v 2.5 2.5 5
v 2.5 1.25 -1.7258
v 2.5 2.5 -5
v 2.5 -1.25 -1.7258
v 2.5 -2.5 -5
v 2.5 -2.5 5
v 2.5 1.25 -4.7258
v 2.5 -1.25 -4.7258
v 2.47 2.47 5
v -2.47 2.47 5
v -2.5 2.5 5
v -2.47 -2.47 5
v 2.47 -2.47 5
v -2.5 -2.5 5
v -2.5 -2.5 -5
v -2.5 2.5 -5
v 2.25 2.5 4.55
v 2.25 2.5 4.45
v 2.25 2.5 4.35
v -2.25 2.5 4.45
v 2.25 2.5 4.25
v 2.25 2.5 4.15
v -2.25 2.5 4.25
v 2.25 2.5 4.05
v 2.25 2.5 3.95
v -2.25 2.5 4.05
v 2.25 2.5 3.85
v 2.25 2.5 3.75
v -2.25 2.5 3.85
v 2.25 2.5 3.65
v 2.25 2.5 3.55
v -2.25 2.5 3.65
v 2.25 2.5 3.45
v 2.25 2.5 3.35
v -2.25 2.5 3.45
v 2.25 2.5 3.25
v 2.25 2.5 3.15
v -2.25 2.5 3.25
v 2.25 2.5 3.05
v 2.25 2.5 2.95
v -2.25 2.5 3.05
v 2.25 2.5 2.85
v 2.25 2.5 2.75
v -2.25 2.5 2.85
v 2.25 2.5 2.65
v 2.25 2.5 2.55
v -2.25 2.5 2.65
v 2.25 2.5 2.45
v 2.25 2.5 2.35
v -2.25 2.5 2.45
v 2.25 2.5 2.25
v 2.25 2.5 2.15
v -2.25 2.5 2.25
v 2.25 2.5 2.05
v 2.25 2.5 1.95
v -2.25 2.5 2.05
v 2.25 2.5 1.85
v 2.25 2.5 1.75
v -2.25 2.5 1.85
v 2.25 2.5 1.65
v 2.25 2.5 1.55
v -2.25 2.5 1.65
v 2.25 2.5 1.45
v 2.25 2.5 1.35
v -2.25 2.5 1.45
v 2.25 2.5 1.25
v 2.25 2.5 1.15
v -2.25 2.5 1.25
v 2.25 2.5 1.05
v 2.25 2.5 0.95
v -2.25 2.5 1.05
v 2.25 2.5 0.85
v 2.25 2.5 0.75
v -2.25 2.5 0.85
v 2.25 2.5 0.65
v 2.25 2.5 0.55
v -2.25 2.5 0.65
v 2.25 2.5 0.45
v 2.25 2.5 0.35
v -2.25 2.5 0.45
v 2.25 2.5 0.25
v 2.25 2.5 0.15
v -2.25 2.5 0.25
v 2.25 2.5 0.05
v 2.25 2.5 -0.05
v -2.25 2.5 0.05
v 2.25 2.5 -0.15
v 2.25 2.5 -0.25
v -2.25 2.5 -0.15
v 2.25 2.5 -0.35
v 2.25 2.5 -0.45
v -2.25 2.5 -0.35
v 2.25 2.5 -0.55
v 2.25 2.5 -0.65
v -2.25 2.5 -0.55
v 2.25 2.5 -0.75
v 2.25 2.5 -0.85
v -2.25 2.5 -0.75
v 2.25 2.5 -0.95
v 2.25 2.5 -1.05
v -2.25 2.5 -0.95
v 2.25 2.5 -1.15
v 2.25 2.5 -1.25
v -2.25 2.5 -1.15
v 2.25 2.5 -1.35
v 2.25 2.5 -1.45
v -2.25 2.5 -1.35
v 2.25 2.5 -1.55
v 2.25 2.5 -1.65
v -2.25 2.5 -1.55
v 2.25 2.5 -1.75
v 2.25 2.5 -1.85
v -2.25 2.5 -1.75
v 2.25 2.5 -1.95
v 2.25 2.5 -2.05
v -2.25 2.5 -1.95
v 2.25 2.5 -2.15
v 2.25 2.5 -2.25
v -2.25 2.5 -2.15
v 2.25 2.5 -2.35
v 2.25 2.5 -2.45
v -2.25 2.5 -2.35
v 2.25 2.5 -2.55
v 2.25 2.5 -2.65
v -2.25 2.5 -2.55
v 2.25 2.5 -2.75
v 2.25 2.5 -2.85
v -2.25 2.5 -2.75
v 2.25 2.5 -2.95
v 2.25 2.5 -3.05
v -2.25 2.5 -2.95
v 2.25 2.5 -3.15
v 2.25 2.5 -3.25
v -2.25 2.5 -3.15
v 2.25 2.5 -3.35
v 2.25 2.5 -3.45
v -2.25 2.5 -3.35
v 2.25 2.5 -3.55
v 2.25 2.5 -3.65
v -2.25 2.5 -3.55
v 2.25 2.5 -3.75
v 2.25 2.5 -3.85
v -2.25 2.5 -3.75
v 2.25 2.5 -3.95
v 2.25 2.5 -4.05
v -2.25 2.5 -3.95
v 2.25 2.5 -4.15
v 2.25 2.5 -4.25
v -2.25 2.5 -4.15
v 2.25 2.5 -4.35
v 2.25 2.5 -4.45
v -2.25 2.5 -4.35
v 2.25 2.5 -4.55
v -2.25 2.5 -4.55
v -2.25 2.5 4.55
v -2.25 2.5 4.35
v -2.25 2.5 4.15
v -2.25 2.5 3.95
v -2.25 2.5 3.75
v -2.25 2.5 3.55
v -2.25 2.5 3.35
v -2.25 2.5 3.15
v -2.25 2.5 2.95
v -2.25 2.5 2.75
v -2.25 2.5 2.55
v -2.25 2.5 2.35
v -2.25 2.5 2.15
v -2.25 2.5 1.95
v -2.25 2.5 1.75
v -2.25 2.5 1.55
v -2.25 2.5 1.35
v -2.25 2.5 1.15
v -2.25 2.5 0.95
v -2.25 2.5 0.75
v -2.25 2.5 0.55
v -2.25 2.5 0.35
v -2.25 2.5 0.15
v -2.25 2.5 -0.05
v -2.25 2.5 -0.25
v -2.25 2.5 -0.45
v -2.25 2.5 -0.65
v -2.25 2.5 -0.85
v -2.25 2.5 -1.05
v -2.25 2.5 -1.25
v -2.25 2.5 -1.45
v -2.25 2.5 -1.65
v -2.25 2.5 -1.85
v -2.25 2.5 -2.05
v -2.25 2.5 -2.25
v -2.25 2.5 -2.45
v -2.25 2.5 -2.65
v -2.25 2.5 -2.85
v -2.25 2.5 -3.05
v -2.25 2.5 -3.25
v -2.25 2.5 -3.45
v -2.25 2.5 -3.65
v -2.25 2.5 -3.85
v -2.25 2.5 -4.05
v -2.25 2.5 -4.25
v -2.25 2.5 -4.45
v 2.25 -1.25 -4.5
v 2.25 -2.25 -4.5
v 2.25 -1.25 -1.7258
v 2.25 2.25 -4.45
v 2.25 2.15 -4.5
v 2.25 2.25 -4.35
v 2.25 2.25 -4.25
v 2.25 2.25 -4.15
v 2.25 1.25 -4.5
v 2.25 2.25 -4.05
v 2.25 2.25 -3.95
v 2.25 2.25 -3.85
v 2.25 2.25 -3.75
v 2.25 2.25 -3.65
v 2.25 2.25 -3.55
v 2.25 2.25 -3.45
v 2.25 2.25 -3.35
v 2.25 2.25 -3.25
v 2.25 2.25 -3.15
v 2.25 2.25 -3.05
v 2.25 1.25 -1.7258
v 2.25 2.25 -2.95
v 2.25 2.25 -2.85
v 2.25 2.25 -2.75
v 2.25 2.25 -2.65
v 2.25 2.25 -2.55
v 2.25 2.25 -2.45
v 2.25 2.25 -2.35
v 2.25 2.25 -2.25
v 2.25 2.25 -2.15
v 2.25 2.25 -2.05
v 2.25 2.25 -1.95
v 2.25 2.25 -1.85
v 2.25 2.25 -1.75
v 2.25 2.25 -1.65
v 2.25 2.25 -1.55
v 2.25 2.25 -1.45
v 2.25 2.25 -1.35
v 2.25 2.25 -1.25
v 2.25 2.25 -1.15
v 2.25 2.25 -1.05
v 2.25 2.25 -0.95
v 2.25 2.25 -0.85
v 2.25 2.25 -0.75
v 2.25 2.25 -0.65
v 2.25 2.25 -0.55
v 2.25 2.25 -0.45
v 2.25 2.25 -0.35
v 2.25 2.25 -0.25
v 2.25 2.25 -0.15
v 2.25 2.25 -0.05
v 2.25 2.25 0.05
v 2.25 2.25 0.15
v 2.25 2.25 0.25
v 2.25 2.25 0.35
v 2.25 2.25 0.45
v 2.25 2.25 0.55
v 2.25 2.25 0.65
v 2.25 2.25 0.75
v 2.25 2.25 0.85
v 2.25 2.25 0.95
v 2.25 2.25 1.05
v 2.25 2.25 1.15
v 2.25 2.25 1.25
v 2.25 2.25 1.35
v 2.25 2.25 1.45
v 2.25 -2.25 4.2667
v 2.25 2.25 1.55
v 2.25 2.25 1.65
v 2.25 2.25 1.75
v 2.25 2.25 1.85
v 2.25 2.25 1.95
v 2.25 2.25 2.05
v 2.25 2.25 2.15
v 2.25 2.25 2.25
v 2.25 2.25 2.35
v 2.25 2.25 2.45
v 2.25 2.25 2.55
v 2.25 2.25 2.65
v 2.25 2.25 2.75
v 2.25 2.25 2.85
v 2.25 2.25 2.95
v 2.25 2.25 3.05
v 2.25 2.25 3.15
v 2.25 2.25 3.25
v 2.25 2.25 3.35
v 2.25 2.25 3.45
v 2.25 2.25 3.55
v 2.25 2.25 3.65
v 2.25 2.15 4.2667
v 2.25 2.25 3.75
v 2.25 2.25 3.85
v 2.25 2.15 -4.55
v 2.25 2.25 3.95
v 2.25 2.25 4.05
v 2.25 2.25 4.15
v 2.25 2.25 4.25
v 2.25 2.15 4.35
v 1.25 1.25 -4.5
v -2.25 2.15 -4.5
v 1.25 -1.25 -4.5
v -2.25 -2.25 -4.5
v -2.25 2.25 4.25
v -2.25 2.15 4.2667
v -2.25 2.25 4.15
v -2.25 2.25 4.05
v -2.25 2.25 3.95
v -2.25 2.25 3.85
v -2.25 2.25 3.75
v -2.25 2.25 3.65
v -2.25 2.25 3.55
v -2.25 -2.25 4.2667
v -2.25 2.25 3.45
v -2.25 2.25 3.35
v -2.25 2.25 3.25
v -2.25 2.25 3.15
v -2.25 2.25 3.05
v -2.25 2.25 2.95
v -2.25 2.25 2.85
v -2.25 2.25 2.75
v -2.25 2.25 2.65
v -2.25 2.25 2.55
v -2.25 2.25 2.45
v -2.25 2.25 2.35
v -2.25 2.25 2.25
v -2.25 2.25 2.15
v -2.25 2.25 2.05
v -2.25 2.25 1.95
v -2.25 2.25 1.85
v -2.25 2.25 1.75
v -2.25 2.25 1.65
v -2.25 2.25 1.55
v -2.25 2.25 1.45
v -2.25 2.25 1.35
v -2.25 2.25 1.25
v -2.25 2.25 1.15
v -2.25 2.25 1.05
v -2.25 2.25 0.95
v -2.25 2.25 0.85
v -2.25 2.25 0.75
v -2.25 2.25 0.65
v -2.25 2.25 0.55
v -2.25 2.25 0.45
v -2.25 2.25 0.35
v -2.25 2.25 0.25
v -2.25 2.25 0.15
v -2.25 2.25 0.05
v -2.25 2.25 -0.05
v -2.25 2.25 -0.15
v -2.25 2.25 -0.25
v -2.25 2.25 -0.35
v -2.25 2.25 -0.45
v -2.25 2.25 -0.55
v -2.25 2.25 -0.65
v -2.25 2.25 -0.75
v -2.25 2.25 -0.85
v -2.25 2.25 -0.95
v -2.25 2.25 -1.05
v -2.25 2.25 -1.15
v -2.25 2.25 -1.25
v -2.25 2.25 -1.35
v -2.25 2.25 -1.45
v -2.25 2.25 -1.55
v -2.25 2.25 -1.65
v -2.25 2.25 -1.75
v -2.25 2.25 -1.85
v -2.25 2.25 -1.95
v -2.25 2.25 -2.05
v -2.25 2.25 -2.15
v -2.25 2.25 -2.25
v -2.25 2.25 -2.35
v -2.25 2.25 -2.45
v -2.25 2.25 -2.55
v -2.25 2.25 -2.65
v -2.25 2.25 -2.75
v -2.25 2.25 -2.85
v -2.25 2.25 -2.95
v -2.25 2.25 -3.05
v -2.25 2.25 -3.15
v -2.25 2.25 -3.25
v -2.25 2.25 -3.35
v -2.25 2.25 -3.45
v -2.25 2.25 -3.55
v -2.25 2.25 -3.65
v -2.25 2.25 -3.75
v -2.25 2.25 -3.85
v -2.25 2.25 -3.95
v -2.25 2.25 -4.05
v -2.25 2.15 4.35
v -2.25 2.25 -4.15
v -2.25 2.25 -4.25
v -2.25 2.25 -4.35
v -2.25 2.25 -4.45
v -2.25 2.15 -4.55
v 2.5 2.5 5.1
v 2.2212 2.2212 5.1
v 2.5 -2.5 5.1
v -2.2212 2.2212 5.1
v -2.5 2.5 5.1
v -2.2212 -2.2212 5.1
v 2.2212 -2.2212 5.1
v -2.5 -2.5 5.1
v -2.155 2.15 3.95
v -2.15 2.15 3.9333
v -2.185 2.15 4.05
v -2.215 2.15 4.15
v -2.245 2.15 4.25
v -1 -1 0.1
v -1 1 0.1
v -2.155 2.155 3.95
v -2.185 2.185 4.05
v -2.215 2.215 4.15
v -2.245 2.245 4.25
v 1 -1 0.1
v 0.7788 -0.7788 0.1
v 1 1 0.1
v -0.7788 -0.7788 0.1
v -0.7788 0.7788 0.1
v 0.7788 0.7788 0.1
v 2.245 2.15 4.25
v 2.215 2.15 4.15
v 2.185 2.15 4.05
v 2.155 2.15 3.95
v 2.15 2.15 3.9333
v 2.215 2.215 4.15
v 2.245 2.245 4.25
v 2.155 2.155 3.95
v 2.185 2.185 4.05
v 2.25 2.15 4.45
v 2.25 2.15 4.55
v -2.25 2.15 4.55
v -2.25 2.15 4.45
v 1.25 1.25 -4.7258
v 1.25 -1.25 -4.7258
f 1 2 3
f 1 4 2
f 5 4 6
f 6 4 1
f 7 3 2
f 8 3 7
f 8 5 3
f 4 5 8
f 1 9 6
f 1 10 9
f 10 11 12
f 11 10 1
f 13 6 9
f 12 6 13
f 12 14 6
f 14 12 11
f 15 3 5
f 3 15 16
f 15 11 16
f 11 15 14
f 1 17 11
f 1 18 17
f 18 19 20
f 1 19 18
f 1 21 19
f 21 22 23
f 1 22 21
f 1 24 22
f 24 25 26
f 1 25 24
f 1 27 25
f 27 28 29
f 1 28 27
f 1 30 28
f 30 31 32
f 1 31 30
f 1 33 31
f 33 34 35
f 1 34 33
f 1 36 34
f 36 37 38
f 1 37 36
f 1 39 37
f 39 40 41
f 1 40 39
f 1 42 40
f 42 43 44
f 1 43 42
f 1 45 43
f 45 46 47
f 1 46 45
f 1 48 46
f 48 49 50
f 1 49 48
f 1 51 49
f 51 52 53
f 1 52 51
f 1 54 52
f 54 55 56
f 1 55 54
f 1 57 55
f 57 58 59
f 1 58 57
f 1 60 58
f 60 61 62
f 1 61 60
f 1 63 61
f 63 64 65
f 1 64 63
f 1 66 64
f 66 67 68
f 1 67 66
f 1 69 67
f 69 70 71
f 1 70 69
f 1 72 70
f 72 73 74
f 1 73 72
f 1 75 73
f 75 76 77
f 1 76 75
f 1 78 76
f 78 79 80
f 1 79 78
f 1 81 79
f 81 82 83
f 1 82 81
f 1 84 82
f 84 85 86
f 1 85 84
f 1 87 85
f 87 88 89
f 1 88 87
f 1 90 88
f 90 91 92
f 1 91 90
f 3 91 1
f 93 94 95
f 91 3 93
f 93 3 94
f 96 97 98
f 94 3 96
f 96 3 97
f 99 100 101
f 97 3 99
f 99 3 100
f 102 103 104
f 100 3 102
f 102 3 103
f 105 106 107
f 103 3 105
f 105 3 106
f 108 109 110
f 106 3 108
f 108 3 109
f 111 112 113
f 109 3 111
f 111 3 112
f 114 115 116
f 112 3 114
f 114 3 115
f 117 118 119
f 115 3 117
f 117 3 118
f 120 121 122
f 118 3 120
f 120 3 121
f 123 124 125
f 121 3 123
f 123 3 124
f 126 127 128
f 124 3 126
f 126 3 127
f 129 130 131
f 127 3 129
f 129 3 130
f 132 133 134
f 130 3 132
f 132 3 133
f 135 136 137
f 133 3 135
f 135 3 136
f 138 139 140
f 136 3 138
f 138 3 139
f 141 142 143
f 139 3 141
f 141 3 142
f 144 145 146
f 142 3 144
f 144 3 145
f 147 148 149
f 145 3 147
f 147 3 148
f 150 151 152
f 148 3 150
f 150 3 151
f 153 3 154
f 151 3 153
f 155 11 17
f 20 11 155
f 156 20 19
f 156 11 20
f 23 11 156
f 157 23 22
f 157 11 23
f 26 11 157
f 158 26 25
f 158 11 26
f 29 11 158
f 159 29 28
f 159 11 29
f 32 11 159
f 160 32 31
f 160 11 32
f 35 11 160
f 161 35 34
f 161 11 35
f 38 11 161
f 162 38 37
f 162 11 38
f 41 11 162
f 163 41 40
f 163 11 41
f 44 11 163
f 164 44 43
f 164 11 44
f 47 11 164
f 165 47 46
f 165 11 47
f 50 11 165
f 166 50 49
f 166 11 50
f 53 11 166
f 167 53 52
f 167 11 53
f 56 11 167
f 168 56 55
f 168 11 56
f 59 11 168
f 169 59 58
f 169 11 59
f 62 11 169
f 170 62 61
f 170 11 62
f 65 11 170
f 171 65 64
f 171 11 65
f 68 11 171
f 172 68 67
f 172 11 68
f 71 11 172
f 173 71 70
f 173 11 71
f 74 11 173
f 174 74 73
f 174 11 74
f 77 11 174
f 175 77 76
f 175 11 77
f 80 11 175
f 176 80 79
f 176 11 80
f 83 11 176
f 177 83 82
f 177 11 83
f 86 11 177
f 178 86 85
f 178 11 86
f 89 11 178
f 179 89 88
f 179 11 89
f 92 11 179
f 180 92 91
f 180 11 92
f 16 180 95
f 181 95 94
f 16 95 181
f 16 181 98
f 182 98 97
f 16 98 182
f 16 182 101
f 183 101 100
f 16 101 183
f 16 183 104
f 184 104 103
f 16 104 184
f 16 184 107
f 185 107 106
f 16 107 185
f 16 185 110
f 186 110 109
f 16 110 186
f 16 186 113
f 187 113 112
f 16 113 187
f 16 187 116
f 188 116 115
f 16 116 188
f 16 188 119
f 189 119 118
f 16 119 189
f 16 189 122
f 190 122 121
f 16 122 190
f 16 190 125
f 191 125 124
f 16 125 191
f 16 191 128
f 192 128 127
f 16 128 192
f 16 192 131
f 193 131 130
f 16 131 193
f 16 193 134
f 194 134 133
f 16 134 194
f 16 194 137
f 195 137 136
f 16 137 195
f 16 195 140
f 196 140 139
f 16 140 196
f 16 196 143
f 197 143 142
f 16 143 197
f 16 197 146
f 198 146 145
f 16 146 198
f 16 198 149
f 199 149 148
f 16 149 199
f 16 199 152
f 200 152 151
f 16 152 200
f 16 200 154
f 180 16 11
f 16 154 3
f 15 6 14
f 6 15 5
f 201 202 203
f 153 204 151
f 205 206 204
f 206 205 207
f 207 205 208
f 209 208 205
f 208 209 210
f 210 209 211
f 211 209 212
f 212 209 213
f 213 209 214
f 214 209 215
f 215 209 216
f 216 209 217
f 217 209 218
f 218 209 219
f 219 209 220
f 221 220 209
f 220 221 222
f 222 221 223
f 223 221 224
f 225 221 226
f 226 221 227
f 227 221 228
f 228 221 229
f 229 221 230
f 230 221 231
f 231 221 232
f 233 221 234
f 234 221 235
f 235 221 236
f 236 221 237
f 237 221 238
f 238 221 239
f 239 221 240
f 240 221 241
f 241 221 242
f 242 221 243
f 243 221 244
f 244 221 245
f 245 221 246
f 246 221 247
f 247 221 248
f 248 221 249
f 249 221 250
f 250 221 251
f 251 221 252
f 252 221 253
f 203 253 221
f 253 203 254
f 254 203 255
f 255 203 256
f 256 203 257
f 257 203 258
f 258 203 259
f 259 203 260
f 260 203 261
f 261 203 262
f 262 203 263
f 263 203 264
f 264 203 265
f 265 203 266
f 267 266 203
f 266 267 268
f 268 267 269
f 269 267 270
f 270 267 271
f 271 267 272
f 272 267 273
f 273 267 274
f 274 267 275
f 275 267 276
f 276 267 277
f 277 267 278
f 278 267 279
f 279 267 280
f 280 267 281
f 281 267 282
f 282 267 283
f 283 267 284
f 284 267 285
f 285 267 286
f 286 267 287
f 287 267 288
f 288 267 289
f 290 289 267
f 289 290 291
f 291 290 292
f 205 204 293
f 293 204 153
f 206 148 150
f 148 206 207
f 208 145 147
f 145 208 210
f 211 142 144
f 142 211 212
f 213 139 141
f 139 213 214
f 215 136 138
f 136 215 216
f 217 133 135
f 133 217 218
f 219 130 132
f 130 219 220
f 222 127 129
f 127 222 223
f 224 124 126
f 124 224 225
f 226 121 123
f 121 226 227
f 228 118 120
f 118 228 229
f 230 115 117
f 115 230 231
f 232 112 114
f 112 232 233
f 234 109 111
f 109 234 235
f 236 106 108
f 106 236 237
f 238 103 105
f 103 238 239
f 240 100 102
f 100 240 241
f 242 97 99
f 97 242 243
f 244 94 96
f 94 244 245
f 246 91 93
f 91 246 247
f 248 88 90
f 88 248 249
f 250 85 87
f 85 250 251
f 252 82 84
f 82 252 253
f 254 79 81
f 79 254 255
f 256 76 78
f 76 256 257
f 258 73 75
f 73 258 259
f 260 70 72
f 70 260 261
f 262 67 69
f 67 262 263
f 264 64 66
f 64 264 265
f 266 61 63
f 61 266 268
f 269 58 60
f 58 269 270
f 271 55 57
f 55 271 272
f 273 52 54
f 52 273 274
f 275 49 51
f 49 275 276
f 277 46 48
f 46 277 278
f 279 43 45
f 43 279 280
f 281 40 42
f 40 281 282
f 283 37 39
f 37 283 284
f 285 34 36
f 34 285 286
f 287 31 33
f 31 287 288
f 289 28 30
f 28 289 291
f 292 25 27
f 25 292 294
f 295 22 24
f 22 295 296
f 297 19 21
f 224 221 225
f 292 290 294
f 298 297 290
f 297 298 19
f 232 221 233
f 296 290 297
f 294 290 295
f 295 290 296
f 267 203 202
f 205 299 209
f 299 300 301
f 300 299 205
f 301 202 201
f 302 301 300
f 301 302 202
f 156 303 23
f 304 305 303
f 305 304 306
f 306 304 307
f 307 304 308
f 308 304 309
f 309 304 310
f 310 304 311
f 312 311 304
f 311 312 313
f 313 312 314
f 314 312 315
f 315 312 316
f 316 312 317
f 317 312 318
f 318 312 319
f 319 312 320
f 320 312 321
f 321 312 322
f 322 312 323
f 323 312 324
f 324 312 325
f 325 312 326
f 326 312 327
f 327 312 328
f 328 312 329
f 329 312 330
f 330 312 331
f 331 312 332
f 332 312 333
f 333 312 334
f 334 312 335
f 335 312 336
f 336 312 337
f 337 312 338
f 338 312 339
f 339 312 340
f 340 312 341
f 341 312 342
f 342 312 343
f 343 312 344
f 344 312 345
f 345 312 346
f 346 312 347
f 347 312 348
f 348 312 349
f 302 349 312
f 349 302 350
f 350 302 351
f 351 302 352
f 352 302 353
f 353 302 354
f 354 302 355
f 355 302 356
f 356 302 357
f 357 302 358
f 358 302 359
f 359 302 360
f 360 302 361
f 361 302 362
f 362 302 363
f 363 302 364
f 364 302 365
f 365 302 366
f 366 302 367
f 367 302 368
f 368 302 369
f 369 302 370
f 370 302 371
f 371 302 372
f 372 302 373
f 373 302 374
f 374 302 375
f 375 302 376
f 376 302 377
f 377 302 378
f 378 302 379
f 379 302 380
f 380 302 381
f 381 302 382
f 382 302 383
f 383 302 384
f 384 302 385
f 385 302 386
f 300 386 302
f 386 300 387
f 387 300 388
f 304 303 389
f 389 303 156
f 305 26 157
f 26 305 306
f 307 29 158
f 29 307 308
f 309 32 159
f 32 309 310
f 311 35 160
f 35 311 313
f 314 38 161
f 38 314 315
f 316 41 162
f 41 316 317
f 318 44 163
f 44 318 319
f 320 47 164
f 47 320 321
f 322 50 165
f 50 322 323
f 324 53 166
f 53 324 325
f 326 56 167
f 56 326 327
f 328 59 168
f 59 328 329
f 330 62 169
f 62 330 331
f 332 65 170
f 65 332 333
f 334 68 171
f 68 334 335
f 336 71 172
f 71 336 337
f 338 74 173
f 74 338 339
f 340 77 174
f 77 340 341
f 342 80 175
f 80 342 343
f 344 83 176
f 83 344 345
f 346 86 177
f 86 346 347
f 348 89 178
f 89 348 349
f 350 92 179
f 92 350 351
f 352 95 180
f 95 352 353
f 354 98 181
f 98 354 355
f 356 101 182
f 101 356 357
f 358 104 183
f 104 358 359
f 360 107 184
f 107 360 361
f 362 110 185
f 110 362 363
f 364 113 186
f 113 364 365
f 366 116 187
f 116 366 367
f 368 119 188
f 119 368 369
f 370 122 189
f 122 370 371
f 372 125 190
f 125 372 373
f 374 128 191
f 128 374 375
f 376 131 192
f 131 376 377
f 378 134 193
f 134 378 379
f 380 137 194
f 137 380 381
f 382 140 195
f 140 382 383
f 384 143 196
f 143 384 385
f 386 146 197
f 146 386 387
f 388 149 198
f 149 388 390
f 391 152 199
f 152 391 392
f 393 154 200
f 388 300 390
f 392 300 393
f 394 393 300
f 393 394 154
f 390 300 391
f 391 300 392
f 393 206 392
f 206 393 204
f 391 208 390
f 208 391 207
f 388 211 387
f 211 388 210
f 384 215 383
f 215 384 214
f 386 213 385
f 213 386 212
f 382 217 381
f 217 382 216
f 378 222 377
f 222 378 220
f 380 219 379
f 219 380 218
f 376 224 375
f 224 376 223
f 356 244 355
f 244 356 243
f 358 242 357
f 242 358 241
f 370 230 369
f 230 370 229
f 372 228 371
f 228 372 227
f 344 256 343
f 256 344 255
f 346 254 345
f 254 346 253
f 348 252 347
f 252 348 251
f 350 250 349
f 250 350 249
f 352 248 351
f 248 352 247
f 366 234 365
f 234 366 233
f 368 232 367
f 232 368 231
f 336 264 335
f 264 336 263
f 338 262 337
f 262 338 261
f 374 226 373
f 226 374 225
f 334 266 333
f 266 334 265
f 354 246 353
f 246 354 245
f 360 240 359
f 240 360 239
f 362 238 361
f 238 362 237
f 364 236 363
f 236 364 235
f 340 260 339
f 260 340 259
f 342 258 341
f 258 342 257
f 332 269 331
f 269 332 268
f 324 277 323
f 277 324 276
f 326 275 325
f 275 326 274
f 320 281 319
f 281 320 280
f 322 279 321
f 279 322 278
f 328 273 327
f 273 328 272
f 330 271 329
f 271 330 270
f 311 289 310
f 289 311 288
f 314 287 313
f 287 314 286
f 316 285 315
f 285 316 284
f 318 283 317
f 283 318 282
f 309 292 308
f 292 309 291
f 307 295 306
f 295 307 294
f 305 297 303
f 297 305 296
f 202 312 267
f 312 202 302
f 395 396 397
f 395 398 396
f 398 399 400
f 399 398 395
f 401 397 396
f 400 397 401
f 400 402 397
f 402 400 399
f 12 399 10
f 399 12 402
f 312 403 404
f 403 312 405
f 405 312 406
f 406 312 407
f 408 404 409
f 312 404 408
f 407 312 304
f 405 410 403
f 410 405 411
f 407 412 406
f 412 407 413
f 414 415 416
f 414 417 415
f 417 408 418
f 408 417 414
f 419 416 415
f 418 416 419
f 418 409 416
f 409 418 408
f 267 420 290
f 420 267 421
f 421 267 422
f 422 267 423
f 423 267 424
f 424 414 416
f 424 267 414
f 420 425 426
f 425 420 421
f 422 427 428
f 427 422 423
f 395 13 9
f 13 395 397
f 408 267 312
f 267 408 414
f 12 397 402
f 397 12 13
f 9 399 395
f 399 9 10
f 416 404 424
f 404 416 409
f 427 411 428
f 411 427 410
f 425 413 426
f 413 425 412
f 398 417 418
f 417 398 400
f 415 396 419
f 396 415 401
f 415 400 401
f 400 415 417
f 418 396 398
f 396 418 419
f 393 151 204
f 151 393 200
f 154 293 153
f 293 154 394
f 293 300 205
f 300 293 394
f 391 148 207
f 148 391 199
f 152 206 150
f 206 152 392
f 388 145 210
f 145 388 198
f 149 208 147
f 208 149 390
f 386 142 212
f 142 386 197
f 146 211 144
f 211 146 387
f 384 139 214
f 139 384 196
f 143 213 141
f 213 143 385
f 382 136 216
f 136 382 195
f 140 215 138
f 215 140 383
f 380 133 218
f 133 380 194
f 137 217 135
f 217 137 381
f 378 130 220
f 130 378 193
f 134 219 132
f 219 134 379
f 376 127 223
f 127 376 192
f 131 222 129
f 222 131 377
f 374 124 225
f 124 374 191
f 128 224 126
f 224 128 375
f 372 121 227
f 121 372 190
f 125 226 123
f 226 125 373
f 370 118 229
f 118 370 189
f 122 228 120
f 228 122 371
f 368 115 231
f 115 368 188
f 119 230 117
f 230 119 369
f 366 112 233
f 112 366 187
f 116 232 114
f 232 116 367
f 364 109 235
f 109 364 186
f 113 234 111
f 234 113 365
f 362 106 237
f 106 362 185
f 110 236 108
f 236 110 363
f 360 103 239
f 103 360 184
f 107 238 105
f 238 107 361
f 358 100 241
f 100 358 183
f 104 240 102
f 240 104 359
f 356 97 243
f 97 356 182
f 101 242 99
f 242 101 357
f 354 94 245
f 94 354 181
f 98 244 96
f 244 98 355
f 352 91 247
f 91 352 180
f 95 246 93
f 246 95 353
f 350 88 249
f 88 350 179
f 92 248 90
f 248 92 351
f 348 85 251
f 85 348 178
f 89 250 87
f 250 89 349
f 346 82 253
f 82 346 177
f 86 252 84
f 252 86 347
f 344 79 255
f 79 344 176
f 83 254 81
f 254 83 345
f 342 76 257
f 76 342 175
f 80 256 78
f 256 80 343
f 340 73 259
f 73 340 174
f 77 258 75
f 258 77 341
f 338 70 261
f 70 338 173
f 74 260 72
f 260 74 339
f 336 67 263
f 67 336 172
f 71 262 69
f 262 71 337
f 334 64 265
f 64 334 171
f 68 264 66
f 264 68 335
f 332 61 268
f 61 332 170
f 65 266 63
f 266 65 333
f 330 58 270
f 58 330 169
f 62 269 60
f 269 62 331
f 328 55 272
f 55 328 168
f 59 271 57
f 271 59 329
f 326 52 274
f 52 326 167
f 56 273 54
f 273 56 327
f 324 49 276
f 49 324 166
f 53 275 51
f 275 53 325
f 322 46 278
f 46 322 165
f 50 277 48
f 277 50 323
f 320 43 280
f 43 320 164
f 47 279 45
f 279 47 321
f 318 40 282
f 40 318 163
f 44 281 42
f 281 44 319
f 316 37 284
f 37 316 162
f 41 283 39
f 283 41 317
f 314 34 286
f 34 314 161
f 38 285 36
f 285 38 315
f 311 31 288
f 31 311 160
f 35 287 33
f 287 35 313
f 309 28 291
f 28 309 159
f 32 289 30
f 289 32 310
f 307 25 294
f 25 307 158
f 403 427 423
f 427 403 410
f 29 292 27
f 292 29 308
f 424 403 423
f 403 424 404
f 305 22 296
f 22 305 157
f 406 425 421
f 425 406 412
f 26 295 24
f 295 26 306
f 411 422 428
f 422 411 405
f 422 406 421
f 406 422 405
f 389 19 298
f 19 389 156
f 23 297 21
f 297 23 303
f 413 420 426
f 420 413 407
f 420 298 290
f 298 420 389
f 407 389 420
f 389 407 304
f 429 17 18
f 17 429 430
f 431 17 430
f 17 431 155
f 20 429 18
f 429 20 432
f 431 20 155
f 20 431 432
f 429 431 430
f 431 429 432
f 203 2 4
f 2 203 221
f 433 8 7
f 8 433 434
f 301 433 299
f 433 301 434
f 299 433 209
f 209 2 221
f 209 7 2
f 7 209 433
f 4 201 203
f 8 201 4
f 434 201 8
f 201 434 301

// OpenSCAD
module frustum(base,top,height){
    linear_extrude(height=height,scale=top/base) square([base,base],center=true);
}

module hollow_frustum(base,top,height){
    difference(){
        frustum(base,top,height);
        translate([0,0,-0.1]) frustum(base-0.5,top-0.5,height+0.2);
    }
}

module box(l,s,d,h){
    
    color("#eeeee4") difference(){
        cube([s,s,l],center=true);
        translate([0,0,0.5])cube([s-0.5,s-0.5,l],center=true);
    }
    color("#e28743") translate([0,0,l/2+0.1]) rotate([180,0,0])  hollow_frustum(s,h,d);
}


module bar(l,s,n){
    for (z=[0+0.5:(l/n):l-0.5]){
         translate([0,s/2,z-l/2]) cube([s-0.5,0.7,0.1],center=true);
    }
}


module trap(length,width,inner_width,depth,n_bar){
     difference(){
        box(length,width,depth,inner_width);
        bar(length,width,n_bar);
        translate([width/2,0,-length/3.1]) cube([width*0.5,width*0.5,length*0.3],center=true);
     }
 }
 
 //EDIT TRAP HERE
trap(length=10,width=5,inner_width=2,depth=5,n_bar=50);
      


   
